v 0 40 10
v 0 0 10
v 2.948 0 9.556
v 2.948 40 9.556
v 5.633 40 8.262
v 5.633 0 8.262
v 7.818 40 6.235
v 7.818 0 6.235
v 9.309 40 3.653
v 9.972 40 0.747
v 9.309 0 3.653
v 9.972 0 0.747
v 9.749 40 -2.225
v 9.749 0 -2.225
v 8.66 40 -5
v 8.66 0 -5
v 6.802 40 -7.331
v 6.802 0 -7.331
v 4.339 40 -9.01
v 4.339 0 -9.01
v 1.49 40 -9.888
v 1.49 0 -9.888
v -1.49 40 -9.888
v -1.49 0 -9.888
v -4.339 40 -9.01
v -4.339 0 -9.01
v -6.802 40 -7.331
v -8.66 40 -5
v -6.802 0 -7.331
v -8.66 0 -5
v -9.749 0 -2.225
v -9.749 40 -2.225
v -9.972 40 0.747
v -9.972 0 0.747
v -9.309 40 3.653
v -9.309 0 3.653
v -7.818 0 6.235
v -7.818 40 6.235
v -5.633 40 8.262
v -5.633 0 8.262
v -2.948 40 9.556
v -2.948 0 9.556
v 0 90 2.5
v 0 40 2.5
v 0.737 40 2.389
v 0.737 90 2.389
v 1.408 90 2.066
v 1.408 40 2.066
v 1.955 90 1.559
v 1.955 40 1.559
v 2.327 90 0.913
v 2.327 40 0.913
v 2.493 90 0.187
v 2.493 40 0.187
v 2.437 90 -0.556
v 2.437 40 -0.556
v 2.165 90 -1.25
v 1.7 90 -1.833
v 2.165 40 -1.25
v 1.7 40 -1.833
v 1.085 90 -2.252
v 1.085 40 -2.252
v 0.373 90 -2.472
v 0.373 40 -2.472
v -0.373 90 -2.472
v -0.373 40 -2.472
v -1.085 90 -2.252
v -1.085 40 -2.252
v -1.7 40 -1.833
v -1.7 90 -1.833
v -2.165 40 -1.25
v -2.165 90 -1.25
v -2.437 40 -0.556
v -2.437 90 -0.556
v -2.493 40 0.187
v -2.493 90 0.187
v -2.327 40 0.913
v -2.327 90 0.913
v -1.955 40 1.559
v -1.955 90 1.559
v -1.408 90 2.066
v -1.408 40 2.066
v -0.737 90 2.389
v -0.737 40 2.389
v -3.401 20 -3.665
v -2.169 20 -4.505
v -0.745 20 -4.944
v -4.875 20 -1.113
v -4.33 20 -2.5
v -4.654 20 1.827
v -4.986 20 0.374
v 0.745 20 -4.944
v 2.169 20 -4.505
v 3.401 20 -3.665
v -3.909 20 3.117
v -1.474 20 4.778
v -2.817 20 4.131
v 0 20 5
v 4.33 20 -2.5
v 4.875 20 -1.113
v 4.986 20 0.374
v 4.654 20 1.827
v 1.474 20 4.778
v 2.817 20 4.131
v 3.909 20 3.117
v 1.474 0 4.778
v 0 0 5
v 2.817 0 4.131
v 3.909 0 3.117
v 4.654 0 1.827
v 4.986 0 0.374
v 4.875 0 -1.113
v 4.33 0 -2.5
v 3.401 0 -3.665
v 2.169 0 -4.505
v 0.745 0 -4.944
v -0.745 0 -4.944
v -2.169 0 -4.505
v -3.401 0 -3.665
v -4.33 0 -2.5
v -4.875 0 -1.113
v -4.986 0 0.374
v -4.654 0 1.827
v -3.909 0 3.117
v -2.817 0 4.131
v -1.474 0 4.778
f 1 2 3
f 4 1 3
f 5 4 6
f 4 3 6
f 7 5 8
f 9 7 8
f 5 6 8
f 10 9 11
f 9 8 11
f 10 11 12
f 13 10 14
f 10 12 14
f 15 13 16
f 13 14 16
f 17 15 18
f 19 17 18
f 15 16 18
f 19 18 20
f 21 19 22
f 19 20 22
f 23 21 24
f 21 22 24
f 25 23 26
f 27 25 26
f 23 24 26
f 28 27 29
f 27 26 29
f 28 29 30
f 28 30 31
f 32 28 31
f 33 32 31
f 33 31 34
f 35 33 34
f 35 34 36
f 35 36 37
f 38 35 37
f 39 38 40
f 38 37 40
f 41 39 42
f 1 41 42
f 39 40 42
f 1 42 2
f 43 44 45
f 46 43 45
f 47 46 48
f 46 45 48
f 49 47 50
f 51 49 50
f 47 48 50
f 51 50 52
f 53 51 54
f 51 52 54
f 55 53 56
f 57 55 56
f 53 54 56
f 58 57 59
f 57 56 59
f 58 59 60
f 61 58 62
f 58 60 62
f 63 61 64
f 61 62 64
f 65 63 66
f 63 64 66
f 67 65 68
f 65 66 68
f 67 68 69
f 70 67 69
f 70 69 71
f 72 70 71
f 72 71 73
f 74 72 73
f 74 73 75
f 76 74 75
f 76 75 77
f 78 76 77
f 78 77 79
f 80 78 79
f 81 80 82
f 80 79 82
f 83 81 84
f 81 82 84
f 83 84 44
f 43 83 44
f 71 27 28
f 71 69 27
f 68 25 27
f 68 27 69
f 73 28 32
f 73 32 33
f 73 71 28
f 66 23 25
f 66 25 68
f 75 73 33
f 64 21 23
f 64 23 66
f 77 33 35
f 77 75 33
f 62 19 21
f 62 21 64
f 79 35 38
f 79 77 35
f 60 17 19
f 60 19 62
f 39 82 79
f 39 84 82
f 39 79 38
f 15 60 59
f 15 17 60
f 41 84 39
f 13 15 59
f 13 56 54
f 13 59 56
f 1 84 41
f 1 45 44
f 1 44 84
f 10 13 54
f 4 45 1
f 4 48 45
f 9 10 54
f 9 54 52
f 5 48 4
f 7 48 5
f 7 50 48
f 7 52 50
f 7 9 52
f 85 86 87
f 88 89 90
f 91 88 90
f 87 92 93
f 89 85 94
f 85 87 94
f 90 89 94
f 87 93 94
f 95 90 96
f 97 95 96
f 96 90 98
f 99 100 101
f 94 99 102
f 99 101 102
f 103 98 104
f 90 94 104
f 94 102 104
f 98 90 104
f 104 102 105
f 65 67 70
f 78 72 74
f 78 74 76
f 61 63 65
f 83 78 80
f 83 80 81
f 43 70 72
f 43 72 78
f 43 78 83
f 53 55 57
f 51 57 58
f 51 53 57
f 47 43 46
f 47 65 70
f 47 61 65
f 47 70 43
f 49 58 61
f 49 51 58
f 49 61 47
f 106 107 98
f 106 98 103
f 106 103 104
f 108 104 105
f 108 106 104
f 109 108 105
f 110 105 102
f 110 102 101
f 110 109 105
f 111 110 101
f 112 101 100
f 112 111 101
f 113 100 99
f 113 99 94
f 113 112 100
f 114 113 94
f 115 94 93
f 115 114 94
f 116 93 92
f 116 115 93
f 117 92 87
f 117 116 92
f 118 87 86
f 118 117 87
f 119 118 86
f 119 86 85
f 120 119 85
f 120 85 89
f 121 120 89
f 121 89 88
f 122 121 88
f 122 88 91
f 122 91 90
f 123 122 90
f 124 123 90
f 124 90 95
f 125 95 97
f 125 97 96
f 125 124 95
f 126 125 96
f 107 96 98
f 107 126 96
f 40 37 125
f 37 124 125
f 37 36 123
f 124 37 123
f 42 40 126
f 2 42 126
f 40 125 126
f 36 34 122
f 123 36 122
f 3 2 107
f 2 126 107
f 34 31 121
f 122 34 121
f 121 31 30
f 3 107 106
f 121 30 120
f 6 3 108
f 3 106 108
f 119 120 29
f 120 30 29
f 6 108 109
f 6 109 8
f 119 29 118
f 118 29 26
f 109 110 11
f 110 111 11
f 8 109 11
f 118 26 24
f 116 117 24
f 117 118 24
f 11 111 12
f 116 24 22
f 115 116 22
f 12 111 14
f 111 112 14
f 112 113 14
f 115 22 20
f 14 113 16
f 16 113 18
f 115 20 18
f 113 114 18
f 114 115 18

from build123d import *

# Parameters (mm, degrees)
SKETCH2_R           = 10
SKETCH2_R_2         = 2.5
BOSS_EXTRUDE1_DEPTH = 40
BOSS_EXTRUDE2_START = 40
SKETCH2_3_R         = 2.5
BOSS_EXTRUDE2_DEPTH = 50
SKETCH3_R           = 5
CUT_EXTRUDE1_DEPTH  = 20


with BuildPart() as part:
    # Sketch2 → Boss-Extrude1 (new body)
    # profile 1 of 2: a face of its own
    with BuildSketch(Plane(origin=(0, 0, 0), x_dir=(1, 0, 0), z_dir=(0, 1, 0))):
        with Locations(Location((0, 0, 0), (0, 0, 270))):
            Circle(SKETCH2_R)
        Circle(SKETCH2_R_2, mode=Mode.SUBTRACT)
    # profile 2 of 2: a face of its own
    with BuildSketch(Plane(origin=(0, 0, 0), x_dir=(1, 0, 0), z_dir=(0, 1, 0))):
        Circle(SKETCH2_R_2)
    extrude(amount=BOSS_EXTRUDE1_DEPTH)

    # Sketch2<3> → Boss-Extrude2 (add)
    with BuildSketch(Plane(origin=(0, 0, 0), x_dir=(1, 0, 0), z_dir=(0, 1, 0)).offset(BOSS_EXTRUDE2_START)):
        with Locations(Location((0, 0, 0), (0, 0, 270))):
            Circle(SKETCH2_3_R)
    extrude(amount=BOSS_EXTRUDE2_DEPTH)

    # Sketch3 → Cut-Extrude1 (cut)
    with BuildSketch(Plane(origin=(0, 0, 0), x_dir=(1, 0, 0), z_dir=(0, 1, 0))):
        with Locations(Location((0, 0, 0), (0, 0, 270))):
            Circle(SKETCH3_R)
    extrude(amount=CUT_EXTRUDE1_DEPTH, mode=Mode.SUBTRACT)


solid = part.part
